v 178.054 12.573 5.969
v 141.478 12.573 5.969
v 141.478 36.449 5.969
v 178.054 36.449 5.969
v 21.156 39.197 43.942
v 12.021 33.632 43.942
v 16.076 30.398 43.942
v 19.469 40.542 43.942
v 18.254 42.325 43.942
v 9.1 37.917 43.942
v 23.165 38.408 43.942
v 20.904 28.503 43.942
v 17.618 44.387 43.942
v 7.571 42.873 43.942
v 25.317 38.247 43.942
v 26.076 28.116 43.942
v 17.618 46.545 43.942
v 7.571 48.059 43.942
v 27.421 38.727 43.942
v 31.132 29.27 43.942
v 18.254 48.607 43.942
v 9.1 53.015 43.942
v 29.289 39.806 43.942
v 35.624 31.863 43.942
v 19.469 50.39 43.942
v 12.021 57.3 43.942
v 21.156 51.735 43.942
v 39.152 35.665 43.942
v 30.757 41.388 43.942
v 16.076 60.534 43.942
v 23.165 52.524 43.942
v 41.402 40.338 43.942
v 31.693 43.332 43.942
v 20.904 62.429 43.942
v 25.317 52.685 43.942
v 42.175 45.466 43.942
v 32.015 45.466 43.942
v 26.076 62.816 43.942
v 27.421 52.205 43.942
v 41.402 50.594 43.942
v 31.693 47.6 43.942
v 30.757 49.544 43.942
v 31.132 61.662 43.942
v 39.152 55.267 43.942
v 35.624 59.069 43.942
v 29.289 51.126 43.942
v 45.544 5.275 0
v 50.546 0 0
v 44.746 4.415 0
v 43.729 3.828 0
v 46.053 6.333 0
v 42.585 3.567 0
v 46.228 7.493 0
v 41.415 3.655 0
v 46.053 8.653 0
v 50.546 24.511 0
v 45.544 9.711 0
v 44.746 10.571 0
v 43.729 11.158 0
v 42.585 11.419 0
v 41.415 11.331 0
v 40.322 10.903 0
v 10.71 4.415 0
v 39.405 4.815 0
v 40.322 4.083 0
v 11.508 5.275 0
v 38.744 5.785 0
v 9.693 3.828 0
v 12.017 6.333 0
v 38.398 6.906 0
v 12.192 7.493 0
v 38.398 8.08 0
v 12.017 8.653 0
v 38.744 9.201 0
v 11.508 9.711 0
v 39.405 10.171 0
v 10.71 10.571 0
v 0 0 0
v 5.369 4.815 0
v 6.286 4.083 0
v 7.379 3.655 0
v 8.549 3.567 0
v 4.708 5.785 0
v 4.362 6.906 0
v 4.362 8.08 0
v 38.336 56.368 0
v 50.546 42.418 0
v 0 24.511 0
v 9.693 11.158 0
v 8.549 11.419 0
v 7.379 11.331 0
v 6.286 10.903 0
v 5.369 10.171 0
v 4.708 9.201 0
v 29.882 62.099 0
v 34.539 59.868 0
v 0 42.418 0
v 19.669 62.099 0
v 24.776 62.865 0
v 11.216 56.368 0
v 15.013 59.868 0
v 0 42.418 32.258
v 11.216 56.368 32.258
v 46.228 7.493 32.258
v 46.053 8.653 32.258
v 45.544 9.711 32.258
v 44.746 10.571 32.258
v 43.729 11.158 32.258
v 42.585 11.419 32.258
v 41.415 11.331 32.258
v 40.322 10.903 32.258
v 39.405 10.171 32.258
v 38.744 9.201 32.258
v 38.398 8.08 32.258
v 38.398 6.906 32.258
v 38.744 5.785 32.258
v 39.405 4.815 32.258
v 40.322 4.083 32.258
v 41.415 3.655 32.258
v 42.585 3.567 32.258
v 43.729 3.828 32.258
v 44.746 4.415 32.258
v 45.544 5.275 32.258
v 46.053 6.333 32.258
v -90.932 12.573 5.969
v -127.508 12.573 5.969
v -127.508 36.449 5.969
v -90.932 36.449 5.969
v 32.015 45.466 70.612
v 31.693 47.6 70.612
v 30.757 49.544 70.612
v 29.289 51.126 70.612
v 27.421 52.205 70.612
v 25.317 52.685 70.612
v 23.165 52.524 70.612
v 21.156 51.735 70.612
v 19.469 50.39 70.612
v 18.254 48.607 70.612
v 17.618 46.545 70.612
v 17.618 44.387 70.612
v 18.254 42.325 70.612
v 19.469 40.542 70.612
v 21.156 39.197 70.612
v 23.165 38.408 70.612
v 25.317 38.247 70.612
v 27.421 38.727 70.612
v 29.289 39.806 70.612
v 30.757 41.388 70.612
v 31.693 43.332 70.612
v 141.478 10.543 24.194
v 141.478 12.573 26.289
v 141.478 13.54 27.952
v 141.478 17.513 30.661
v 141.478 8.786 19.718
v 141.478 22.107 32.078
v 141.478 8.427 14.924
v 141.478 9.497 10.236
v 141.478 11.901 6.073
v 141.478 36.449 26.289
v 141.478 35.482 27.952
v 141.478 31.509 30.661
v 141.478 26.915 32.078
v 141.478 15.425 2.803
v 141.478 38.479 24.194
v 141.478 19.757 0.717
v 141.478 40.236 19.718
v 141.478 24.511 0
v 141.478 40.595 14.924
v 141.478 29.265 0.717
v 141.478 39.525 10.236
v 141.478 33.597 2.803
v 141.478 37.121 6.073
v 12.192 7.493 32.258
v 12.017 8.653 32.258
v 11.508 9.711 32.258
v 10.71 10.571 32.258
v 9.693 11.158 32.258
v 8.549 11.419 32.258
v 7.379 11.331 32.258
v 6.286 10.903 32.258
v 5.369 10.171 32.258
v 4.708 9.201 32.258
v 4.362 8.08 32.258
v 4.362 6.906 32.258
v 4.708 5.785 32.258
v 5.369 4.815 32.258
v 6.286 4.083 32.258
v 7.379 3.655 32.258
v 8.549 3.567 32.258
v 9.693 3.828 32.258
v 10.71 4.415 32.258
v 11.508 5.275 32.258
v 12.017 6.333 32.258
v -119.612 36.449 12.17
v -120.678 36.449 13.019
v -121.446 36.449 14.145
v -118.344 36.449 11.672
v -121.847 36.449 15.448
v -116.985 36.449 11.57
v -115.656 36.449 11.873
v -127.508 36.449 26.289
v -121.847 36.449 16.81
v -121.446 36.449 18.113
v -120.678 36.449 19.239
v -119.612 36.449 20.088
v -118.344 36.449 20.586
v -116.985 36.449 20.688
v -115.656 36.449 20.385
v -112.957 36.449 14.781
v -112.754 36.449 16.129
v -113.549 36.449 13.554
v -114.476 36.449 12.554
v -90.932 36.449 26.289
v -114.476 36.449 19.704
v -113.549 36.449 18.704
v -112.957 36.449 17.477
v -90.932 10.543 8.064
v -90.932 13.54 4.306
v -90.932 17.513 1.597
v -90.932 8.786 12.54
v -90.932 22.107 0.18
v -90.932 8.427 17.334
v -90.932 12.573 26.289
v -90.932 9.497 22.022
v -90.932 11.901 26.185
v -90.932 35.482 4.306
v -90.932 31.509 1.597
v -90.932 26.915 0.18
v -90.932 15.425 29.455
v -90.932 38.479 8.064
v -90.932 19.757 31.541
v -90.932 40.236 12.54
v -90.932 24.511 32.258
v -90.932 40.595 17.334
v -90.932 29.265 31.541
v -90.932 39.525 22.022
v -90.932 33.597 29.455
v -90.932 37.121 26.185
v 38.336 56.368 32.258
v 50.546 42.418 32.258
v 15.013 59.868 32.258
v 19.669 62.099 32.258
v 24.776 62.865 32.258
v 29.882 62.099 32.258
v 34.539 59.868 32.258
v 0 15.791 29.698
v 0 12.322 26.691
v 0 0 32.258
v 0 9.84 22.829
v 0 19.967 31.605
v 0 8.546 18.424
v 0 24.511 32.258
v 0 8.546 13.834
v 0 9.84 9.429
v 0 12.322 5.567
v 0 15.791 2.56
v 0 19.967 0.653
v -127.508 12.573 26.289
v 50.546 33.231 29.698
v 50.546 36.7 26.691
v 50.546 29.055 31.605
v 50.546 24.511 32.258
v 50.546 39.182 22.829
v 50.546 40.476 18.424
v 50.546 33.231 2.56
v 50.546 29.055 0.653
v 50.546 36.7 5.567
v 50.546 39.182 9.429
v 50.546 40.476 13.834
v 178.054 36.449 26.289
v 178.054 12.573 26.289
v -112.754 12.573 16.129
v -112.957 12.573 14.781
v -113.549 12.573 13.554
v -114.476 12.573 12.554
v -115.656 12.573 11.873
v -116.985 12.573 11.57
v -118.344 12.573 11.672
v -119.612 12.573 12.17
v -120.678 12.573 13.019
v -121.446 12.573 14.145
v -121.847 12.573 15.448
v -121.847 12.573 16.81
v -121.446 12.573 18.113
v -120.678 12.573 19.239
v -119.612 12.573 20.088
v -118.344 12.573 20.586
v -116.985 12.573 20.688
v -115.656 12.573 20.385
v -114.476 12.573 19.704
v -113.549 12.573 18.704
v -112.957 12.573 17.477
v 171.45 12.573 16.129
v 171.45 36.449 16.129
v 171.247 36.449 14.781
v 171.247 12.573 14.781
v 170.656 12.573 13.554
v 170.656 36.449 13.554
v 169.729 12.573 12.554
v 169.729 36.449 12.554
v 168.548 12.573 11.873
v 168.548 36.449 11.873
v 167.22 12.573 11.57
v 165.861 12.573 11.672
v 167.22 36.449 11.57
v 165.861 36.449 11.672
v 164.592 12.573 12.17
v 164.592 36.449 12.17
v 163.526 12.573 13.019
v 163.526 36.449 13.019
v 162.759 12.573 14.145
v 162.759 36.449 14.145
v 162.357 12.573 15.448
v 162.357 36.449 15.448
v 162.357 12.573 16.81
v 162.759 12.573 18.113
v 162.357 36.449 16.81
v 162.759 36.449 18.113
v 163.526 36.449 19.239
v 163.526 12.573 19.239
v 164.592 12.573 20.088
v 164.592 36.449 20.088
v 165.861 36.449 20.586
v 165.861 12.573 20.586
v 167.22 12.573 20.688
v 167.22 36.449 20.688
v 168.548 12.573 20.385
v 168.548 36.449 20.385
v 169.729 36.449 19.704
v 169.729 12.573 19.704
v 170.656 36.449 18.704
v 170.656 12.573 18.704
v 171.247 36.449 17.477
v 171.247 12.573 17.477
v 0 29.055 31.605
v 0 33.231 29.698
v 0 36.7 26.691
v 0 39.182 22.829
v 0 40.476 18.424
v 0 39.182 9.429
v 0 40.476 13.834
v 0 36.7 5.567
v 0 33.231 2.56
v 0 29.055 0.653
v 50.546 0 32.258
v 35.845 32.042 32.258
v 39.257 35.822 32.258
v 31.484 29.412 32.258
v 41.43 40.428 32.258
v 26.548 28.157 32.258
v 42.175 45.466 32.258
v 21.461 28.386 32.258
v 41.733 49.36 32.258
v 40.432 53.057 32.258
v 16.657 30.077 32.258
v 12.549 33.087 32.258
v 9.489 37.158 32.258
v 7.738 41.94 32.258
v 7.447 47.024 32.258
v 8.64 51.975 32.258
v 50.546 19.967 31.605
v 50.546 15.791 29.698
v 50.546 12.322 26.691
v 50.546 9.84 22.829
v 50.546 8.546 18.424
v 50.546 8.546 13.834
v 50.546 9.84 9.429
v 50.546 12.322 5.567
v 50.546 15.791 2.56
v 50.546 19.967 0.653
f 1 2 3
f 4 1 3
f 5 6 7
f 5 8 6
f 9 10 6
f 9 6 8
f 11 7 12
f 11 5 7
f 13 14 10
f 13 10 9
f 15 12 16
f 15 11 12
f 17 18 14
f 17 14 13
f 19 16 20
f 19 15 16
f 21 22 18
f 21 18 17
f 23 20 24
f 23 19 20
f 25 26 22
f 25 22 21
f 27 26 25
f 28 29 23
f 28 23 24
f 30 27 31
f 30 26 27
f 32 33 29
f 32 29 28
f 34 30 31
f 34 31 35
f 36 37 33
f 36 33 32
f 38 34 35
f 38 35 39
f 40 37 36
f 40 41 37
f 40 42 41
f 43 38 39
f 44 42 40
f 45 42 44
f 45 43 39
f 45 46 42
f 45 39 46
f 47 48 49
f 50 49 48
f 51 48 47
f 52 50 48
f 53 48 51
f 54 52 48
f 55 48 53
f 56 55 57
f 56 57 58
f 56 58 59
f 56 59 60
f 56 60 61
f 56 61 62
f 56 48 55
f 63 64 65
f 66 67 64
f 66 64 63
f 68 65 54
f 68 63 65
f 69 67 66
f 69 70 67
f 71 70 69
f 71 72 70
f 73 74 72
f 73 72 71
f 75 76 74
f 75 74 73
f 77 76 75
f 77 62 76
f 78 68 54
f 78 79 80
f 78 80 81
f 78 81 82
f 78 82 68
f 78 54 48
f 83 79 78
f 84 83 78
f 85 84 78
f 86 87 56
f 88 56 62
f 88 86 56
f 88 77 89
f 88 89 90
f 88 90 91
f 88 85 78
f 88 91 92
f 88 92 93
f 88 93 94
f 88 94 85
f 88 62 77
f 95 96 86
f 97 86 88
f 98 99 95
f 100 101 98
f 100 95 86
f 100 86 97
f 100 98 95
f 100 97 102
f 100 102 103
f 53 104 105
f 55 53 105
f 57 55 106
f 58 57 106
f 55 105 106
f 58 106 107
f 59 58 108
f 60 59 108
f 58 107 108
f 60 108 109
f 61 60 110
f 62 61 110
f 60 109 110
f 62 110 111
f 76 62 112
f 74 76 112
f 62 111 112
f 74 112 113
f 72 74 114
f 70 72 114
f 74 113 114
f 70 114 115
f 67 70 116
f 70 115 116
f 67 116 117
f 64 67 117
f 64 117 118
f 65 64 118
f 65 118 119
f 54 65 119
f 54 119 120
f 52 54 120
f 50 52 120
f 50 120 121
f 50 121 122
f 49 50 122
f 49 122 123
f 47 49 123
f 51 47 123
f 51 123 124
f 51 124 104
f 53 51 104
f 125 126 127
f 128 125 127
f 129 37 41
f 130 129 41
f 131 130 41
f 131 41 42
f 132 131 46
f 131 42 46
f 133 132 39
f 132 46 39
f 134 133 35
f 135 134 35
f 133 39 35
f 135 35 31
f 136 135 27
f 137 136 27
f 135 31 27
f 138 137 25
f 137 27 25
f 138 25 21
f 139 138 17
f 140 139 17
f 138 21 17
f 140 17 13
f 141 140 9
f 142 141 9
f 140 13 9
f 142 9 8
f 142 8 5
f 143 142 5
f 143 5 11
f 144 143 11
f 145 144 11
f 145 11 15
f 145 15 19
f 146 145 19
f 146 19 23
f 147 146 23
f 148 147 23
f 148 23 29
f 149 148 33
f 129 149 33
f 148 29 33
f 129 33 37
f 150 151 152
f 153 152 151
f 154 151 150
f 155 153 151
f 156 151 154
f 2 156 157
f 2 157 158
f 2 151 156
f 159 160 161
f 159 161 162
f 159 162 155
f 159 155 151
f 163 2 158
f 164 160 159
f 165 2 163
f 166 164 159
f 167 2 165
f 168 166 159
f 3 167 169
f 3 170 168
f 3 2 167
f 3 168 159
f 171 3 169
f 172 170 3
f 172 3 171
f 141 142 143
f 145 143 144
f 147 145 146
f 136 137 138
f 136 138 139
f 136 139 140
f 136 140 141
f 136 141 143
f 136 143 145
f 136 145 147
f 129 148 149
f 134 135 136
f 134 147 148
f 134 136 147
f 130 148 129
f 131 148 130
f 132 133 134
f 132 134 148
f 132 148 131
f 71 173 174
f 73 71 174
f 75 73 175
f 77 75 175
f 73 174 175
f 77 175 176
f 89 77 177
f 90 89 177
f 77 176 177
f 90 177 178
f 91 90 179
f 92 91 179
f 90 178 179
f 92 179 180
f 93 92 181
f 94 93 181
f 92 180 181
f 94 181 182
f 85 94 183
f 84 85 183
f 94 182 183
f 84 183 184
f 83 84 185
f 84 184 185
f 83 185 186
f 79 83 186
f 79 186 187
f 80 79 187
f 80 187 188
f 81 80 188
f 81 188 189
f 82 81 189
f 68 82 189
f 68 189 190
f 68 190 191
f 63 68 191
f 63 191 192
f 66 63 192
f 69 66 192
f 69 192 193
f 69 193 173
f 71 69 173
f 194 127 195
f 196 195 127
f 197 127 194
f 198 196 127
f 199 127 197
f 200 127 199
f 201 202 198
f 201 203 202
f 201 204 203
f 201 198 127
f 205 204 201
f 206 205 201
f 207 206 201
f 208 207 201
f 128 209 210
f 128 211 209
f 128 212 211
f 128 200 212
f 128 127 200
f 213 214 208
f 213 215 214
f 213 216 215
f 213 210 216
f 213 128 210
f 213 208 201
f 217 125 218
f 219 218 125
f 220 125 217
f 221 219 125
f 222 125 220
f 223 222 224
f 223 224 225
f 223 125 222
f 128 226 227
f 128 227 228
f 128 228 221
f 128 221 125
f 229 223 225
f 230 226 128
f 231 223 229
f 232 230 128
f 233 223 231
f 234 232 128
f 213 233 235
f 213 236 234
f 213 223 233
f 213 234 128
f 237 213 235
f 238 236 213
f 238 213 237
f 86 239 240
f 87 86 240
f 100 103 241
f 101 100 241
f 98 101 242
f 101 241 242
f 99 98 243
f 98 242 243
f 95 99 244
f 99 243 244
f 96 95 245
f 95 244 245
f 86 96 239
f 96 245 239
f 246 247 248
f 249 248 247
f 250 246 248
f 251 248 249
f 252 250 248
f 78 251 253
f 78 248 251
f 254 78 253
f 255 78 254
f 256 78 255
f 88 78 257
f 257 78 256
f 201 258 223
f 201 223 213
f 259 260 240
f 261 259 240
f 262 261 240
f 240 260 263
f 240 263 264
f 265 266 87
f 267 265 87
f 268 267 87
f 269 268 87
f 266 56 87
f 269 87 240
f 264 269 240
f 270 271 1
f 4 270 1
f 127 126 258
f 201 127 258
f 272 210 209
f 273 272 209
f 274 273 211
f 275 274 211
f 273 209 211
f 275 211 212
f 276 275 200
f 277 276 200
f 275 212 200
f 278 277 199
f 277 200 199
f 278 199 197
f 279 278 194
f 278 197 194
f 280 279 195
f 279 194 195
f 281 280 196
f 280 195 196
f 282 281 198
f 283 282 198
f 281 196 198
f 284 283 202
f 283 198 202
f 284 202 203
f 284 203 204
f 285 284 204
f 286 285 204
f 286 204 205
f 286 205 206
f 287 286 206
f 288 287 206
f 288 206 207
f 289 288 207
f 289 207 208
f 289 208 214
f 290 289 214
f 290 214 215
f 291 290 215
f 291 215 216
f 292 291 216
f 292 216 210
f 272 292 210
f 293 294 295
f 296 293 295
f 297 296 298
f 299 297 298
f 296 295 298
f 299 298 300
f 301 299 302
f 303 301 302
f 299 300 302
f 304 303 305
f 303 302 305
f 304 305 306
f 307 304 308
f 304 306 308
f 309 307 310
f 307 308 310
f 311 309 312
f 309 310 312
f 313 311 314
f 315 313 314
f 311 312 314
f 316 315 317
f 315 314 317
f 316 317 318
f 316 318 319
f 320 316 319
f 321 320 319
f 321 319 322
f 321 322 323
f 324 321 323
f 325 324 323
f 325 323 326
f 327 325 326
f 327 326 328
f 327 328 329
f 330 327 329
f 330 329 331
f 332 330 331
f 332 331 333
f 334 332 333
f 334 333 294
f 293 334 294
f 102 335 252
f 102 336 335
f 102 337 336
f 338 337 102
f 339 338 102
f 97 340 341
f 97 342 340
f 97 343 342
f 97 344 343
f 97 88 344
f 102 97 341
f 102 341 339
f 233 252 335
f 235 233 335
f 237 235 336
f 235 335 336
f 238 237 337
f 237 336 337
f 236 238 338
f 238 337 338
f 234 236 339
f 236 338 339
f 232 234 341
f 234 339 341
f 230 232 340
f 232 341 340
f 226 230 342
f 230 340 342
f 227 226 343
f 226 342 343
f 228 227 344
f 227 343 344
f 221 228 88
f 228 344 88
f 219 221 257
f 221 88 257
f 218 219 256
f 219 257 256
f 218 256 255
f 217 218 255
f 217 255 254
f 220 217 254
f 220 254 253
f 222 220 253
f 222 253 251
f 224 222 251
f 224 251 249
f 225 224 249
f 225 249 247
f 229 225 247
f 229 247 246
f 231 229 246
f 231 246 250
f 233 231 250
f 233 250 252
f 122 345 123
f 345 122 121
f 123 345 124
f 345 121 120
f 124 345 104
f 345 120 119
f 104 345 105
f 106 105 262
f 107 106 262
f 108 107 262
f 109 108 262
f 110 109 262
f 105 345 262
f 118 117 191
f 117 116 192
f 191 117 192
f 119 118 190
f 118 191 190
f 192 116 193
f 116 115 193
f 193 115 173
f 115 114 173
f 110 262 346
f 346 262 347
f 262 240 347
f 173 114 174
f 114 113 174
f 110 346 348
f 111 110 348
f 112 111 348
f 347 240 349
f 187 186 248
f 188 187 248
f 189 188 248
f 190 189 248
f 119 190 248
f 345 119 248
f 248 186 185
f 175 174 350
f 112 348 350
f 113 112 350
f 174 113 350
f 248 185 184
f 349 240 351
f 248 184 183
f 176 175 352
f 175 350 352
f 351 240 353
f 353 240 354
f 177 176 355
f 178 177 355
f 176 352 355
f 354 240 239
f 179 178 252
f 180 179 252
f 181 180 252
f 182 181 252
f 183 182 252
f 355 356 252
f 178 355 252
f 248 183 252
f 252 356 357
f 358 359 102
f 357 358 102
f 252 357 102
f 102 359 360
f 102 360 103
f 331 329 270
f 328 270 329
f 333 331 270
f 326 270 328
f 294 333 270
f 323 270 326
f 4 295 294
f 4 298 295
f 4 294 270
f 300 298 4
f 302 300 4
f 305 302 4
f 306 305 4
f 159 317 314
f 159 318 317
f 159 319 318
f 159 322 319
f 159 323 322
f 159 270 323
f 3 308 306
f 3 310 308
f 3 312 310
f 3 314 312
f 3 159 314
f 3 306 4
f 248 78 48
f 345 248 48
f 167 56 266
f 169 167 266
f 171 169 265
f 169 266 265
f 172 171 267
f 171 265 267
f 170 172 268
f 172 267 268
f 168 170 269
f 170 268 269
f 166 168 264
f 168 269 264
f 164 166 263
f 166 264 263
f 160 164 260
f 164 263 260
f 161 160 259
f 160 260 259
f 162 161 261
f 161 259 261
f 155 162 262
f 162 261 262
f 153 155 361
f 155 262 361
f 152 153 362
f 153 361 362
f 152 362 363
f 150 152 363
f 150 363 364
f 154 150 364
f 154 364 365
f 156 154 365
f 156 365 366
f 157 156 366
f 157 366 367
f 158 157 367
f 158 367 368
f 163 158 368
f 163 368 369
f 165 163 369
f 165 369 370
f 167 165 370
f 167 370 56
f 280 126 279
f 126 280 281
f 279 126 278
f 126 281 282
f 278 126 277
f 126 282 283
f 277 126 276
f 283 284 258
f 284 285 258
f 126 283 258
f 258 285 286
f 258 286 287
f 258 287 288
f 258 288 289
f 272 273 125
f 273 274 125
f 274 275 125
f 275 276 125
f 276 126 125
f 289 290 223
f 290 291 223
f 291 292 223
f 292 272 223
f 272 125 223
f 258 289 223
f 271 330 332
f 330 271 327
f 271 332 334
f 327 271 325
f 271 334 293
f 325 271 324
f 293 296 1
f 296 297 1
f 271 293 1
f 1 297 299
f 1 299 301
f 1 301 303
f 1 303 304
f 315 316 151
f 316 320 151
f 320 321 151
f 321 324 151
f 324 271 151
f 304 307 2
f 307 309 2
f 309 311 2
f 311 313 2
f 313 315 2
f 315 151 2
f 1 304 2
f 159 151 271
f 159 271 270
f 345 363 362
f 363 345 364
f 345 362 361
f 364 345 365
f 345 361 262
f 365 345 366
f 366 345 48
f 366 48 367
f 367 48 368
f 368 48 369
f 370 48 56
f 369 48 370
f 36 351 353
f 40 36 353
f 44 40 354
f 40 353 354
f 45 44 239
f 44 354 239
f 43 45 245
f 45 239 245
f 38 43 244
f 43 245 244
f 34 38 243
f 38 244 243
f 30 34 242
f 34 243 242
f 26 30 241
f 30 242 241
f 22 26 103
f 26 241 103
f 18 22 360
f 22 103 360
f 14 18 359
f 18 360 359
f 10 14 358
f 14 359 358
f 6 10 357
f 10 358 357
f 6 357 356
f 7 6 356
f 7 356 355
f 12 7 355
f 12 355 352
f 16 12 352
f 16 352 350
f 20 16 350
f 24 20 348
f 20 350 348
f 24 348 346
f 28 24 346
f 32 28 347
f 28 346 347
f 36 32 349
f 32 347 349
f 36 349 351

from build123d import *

# Parameters (mm, degrees)
SKETCH1_W           = 50.546
SKETCH1_H           = 42.418
BOSS_EXTRUDE1_DEPTH = 32.258
BOSS_EXTRUDE2_DEPTH = 32.258
SKETCH3_R           = 16.129
BOSS_EXTRUDE3_DEPTH = 90.932
SKETCH5_R           = 16.129
BOSS_EXTRUDE4_DEPTH = 90.932
SKETCH6_R           = 3.937
CUT_EXTRUDE1_DEPTH  = 90.932
SKETCH8_R           = 17.399
BOSS_EXTRUDE5_DEPTH = 11.684
SKETCH9_R           = 7.239
BOSS_EXTRUDE6_DEPTH = 26.67
SKETCH10_W          = 20.32
SKETCH10_H          = 23.876
BOSS_EXTRUDE7_DEPTH = 36.576
SKETCH11_W          = 20.32
SKETCH11_H          = 23.876
BOSS_EXTRUDE8_DEPTH = 36.576
SKETCH12_R          = 4.572
CUT_EXTRUDE2_DEPTH  = 36.576


with BuildPart() as part:
    # Sketch1 → Boss-Extrude1 (new body)
    with BuildSketch(Plane.XY):
        with Locations((25.273, 21.209)):
            Rectangle(SKETCH1_W, SKETCH1_H)
    extrude(amount=BOSS_EXTRUDE1_DEPTH)

    # Sketch2 → Boss-Extrude2 (add)
    with BuildSketch(Plane.XY.offset(32.258)):
        with BuildLine():
            Line((0, 42.418), (11.216038208, 56.368169759))
            ThreePointArc((11.216038208, 56.368169759), (24.775827865, 62.865), (38.335617522, 56.368169759))
            Line((38.335617522, 56.368169759), (50.546, 42.418))
            Line((50.546, 42.418), (0, 42.418))
        make_face()
    extrude(amount=-BOSS_EXTRUDE2_DEPTH)

    # Sketch3 → Boss-Extrude3 (add)
    with BuildSketch(Plane.ZY):
        with Locations((16.129, 24.511)):
            Circle(SKETCH3_R)
    extrude(amount=BOSS_EXTRUDE3_DEPTH)

    # Sketch5 → Boss-Extrude4 (add)
    with BuildSketch(Plane(origin=(50.546, 0, 0), x_dir=(0, 0, -1), z_dir=(1, 0, 0))):
        with Locations((-16.129, 24.511)):
            Circle(SKETCH5_R)
    extrude(amount=BOSS_EXTRUDE4_DEPTH)

    # Sketch6 → Cut-Extrude1 (cut)
    with BuildSketch(Plane.XY.offset(32.258)):
        with Locations((42.291, 7.493)):
            Circle(SKETCH6_R)
        with Locations((8.255, 7.493)):
            Circle(SKETCH6_R)
    extrude(amount=-CUT_EXTRUDE1_DEPTH, mode=Mode.SUBTRACT)

    # Sketch8 → Boss-Extrude5 (add)
    with BuildSketch(Plane.XY.offset(32.258)):
        with Locations((24.775827865, 45.466)):
            Circle(SKETCH8_R)
    extrude(amount=BOSS_EXTRUDE5_DEPTH)

    # Sketch9 → Boss-Extrude6 (add)
    with BuildSketch(Plane.XY.offset(43.942)):
        with Locations((24.775827865, 45.466)):
            Circle(SKETCH9_R)
    extrude(amount=BOSS_EXTRUDE6_DEPTH)

    # Sketch10 → Boss-Extrude7 (add)
    with BuildSketch(Plane(origin=(141.478, 0, 0), x_dir=(0, 0, -1), z_dir=(1, 0, 0))):
        with Locations((-16.129, 24.511)):
            Rectangle(SKETCH10_W, SKETCH10_H)
    extrude(amount=BOSS_EXTRUDE7_DEPTH)

    # Sketch11 → Boss-Extrude8 (add)
    with BuildSketch(Plane.ZY.offset(90.932)):
        with Locations((16.129, 24.511)):
            Rectangle(SKETCH11_W, SKETCH11_H)
    extrude(amount=BOSS_EXTRUDE8_DEPTH)

    # Sketch12 → Cut-Extrude2 (cut)
    with BuildSketch(Plane(origin=(0, 36.449, 0), x_dir=(1, 0, 0), z_dir=(0, 1, 0))):
        with Locations((166.878, -16.129)):
            Circle(SKETCH12_R)
        with Locations((-117.326344271, -16.129)):
            Circle(SKETCH12_R)
    extrude(amount=-CUT_EXTRUDE2_DEPTH, mode=Mode.SUBTRACT)


solid = part.part
